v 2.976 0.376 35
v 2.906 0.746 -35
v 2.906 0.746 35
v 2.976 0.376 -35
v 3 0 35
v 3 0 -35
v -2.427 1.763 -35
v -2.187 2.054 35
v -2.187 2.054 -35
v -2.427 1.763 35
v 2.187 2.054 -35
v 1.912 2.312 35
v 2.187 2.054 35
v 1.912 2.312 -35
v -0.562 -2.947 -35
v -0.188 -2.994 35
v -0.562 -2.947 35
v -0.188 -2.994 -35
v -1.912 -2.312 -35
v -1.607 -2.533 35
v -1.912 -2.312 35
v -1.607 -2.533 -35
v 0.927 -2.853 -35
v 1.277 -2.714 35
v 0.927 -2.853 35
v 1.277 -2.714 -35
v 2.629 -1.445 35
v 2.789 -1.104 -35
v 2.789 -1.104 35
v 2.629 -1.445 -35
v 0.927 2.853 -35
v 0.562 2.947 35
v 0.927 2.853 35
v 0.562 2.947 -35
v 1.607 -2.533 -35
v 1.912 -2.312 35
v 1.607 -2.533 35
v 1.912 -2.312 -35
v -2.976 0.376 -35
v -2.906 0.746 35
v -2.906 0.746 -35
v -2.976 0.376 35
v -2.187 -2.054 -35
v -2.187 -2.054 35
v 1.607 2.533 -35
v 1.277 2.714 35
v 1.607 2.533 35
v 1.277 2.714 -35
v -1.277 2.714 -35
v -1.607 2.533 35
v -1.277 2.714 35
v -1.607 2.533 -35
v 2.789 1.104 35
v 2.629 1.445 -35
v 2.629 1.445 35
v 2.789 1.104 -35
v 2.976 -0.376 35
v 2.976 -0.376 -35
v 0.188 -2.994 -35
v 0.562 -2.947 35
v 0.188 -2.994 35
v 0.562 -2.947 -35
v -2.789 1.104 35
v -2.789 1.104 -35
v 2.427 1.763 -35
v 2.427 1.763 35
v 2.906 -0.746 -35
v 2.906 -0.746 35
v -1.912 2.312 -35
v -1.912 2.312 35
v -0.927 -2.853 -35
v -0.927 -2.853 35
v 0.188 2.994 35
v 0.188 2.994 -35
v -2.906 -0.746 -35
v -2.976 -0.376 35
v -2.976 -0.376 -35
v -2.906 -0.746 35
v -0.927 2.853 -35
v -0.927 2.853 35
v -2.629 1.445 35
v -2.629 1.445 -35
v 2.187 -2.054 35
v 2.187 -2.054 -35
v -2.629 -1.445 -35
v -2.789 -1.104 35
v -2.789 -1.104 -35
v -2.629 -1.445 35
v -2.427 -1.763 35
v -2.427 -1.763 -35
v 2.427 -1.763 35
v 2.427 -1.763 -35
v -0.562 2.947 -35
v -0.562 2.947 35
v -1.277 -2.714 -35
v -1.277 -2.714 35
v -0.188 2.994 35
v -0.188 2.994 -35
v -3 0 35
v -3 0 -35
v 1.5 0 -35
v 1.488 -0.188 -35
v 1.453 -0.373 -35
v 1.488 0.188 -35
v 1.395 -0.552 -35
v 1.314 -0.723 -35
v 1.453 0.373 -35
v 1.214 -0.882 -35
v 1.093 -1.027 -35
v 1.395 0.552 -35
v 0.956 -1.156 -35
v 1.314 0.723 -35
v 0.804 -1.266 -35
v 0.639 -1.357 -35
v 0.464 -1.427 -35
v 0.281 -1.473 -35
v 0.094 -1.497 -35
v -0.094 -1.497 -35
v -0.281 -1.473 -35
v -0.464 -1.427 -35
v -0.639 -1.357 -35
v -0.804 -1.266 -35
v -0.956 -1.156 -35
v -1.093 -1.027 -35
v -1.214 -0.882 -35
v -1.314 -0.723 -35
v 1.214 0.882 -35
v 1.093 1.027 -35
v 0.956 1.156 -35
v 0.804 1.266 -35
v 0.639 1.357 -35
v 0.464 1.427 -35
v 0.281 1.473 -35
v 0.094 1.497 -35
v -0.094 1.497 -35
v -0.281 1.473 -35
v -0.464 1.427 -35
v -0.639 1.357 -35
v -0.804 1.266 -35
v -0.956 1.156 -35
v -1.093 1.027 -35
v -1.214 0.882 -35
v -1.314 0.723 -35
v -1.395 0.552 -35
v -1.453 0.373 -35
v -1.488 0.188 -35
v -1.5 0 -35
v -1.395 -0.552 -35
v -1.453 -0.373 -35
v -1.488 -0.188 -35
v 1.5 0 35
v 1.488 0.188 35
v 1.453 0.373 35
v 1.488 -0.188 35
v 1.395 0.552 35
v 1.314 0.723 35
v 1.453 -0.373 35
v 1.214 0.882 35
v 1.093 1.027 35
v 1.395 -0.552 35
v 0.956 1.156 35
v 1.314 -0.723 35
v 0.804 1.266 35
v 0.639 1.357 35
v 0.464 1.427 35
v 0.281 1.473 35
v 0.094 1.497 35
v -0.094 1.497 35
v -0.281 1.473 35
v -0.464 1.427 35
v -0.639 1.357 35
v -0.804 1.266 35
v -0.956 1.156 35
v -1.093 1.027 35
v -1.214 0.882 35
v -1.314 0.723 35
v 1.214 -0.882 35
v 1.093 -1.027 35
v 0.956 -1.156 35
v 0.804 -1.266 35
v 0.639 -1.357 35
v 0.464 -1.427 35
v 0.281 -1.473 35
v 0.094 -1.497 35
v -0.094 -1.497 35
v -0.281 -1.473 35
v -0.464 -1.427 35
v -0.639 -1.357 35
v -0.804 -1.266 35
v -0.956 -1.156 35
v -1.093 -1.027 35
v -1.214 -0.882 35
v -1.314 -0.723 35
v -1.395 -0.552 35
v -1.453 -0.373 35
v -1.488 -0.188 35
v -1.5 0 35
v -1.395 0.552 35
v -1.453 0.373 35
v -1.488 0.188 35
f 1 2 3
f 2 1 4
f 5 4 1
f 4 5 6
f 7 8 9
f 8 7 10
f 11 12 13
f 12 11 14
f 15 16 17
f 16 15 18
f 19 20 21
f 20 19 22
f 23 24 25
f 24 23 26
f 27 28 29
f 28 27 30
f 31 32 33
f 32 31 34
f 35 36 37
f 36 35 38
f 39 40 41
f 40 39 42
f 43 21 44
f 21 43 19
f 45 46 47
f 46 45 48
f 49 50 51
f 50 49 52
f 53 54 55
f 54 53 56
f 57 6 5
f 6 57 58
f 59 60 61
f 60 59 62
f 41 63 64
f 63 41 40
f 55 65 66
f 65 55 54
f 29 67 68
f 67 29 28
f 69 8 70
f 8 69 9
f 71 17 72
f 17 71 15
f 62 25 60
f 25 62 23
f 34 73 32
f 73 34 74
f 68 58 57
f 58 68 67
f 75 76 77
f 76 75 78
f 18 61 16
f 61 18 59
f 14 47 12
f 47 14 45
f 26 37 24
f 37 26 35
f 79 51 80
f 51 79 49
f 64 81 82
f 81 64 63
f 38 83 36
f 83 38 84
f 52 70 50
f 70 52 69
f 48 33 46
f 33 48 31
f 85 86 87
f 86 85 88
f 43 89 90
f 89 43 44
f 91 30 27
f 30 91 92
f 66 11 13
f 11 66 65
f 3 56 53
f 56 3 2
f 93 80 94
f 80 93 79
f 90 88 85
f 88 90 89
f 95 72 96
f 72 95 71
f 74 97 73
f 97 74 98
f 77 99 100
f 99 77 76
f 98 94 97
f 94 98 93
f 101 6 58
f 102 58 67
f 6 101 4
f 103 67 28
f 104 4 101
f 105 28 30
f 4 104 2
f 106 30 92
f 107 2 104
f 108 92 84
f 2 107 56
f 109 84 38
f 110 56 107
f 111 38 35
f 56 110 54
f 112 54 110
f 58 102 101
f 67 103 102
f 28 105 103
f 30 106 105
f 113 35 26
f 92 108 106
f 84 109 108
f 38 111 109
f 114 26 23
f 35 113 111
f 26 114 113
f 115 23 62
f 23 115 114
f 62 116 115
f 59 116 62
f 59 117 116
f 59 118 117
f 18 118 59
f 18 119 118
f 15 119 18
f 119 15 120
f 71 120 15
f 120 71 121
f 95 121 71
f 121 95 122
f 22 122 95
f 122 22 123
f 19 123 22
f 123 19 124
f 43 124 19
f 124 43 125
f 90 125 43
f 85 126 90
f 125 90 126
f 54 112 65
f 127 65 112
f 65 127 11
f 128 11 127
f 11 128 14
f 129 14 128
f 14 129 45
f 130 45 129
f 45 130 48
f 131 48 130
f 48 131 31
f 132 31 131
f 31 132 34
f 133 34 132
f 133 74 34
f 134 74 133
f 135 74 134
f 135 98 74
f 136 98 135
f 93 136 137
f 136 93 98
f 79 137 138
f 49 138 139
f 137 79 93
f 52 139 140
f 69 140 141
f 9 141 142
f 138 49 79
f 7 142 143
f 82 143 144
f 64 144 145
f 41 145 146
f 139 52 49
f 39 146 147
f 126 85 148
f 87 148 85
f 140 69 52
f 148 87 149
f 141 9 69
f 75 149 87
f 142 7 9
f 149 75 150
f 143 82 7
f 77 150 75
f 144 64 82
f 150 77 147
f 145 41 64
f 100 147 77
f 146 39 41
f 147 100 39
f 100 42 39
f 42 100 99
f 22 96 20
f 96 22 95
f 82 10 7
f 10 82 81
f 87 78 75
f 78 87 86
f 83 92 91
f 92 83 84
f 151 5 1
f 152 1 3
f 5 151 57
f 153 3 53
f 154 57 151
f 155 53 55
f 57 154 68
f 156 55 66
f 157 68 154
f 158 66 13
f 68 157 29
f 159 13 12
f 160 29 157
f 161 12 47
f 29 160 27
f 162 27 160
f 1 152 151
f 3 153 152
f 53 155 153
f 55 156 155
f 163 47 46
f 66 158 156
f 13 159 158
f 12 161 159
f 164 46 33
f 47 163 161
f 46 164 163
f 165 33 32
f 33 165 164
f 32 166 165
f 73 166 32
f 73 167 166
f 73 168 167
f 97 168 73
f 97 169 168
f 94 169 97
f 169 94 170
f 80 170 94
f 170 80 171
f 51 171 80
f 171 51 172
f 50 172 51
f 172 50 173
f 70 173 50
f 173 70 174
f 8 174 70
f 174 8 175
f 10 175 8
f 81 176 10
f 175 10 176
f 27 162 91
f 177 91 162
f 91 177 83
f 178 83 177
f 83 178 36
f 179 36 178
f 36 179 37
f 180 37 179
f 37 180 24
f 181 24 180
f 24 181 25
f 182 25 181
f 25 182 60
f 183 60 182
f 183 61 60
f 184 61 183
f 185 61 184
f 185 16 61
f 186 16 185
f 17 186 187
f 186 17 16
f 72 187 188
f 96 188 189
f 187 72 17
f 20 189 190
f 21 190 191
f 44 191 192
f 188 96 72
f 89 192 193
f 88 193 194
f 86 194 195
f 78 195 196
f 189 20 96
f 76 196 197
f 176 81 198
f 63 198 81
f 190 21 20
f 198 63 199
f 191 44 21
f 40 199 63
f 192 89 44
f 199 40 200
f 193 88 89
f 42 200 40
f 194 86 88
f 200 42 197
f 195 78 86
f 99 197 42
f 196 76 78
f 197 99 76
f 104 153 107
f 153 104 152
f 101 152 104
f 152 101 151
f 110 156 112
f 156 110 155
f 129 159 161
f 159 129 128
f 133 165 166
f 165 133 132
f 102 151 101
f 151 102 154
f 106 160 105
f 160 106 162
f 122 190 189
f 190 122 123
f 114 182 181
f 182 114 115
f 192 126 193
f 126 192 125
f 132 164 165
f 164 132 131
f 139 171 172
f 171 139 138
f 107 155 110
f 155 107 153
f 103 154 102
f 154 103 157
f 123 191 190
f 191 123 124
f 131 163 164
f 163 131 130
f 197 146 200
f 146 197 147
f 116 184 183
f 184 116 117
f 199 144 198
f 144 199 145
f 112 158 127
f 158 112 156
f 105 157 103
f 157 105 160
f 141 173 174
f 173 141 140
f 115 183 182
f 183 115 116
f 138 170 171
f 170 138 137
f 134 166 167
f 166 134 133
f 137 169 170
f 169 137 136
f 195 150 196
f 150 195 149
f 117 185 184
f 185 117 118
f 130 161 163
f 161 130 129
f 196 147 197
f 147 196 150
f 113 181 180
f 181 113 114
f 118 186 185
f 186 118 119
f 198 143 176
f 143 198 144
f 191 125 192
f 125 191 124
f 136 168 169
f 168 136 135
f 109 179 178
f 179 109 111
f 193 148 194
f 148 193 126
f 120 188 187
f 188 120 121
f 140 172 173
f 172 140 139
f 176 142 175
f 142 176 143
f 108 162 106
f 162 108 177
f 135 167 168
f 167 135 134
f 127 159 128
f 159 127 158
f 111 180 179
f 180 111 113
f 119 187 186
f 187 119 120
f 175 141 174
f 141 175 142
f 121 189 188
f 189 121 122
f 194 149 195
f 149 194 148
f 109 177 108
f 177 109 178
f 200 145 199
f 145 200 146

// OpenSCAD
$fn = 50;


difference() {
	union() {
		translate(v = [0, 0, -35.0000000000]) {
			cylinder(h = 70, r = 3.0000000000);
		}
	}
	union() {
		translate(v = [0, 0, -100.0000000000]) {
			cylinder(h = 200, r = 1.5000000000);
		}
	}
}
